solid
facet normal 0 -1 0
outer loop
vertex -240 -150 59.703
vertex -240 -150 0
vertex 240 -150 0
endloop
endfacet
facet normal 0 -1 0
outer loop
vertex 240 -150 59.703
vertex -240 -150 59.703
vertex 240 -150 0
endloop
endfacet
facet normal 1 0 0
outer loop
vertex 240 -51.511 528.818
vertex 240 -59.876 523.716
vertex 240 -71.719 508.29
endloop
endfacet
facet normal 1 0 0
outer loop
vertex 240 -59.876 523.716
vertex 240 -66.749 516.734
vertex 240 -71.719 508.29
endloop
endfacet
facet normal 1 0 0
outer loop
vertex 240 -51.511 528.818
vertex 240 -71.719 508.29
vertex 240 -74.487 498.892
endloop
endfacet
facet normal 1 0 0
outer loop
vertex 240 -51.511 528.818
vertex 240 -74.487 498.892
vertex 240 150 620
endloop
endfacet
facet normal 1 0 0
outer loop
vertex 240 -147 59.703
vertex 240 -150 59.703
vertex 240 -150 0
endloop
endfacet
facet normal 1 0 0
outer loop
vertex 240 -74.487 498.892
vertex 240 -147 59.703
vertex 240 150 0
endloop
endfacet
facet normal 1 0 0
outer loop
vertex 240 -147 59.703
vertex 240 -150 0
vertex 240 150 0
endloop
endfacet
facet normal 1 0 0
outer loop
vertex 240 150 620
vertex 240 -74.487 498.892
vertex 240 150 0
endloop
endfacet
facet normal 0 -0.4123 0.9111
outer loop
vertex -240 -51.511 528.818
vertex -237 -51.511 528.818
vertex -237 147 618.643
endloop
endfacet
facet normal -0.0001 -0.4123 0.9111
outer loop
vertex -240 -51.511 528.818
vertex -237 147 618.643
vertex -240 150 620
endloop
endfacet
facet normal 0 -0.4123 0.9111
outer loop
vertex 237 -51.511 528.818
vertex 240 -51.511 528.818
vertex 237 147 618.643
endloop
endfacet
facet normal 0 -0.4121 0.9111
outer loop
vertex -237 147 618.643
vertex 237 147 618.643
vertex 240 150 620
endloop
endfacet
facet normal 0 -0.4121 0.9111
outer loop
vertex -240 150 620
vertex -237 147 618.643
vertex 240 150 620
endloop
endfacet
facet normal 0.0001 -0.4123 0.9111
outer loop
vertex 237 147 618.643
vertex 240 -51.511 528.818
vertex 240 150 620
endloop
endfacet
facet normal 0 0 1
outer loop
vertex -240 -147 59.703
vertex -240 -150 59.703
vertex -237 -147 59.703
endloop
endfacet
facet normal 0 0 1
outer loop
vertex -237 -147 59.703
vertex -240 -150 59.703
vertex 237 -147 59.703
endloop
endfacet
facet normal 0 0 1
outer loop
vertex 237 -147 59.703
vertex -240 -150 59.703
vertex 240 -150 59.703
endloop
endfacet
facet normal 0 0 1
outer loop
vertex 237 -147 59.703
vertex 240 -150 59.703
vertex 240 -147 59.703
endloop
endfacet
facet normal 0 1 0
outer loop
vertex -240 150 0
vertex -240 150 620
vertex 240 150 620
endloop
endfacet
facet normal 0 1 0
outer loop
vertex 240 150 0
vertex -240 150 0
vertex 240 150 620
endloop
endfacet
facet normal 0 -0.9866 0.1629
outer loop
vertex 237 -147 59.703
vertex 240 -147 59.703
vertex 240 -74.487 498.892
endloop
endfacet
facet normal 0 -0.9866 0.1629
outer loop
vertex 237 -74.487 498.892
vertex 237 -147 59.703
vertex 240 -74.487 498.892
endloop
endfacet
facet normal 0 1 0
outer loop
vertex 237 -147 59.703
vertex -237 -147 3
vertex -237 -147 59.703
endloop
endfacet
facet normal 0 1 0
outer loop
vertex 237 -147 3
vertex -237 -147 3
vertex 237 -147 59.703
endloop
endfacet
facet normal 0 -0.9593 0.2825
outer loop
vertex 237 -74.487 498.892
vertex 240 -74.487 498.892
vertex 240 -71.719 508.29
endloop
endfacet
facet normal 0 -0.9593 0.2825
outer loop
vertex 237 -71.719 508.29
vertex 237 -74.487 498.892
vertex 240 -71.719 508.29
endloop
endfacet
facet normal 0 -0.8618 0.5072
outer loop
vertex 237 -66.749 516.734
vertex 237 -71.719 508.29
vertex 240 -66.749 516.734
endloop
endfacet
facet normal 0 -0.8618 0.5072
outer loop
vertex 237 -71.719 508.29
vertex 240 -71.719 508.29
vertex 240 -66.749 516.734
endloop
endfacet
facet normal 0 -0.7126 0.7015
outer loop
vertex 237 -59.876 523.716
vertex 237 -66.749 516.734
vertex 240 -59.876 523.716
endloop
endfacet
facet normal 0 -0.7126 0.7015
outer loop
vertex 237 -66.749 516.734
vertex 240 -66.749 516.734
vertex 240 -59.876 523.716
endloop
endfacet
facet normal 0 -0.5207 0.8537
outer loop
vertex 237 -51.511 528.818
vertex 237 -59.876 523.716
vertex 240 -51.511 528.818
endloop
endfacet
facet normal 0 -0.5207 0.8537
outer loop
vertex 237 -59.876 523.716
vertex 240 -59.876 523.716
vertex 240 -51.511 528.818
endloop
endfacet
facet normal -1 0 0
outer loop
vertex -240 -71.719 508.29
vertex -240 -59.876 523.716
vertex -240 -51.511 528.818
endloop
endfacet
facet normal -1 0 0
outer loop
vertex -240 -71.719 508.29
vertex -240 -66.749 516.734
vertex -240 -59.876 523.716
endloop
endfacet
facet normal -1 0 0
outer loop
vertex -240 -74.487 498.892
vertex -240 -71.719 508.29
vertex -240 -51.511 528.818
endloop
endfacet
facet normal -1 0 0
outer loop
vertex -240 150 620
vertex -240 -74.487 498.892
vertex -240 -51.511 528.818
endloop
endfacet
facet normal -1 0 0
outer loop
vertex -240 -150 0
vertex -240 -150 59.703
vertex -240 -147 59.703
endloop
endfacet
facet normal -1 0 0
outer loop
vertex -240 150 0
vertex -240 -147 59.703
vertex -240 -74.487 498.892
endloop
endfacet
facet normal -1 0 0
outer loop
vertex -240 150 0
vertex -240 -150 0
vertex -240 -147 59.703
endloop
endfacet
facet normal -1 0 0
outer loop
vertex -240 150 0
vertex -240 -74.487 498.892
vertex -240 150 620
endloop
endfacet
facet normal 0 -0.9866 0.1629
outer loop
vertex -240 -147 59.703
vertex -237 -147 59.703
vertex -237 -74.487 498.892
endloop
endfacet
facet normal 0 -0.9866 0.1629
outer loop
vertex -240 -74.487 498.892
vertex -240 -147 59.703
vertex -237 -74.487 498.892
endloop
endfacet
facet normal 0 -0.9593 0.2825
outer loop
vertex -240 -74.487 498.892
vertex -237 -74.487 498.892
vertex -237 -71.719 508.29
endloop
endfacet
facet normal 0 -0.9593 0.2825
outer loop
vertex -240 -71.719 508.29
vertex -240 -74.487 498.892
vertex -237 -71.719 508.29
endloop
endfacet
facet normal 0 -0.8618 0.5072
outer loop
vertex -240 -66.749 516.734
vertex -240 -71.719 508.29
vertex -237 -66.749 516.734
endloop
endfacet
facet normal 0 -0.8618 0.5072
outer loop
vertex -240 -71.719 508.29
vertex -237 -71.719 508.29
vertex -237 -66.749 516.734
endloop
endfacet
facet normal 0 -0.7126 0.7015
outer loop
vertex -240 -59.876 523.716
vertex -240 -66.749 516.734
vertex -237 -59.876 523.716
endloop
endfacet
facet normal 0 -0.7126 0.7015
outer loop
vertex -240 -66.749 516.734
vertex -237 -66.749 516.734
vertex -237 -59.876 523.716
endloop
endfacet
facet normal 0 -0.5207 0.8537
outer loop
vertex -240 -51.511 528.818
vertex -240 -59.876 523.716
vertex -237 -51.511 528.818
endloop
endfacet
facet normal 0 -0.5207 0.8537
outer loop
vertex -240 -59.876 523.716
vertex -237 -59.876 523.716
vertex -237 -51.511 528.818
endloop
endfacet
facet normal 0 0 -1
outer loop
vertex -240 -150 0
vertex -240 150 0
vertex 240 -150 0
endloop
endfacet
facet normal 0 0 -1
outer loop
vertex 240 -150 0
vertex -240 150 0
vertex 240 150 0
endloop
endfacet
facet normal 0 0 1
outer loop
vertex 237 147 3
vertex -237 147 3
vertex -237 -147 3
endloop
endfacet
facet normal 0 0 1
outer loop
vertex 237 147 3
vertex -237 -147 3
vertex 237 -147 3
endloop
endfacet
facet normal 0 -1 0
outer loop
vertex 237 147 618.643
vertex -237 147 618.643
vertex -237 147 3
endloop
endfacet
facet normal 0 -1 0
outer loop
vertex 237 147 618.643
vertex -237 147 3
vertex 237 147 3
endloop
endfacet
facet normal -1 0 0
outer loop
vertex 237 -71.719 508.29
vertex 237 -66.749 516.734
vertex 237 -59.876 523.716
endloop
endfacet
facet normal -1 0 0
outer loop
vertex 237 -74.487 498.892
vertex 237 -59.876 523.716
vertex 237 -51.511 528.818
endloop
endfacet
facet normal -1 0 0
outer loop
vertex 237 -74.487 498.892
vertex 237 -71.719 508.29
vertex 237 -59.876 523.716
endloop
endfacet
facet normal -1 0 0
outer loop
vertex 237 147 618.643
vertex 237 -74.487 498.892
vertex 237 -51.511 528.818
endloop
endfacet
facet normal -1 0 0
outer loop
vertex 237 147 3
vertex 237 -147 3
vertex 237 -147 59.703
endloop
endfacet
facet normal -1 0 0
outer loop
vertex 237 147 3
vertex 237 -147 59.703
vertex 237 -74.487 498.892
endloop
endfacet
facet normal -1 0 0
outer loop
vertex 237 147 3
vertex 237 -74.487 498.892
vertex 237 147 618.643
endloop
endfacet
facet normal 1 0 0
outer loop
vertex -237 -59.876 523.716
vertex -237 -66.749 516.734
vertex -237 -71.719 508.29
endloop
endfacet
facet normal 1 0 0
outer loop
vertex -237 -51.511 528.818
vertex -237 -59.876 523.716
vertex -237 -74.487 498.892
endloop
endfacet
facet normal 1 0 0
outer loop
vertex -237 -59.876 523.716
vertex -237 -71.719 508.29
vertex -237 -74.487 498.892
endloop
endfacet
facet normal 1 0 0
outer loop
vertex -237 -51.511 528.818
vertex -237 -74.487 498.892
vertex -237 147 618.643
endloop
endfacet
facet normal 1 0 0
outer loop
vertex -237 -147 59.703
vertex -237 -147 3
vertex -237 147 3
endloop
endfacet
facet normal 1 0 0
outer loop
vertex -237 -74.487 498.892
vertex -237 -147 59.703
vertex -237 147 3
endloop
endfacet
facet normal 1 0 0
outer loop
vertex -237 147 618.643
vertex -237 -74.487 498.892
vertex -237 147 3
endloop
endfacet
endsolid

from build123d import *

# Parameters (mm, degrees)
F0_W     = 480
F0_H     = 300
F1_DEPTH = 620
F2_T     = -3
F4_DEPTH = 362


with BuildPart() as f1:
    # F0 (on Top) → F1 (new body)
    with BuildSketch(Plane.XY):
        Rectangle(F0_W, F0_H)
    extrude(amount=F1_DEPTH)

    # F2
    f2_openings = [f1.faces().sort_by_distance(p)[0] for p in [
        (0, 0, 620),
    ]]
    offset(amount=F2_T, openings=f2_openings)

    # F3 (on Right) → F4 (cut, symmetric)
    with BuildSketch(Plane.YZ):
        with BuildLine():
            Line((-208.315447, 59.702795), (-150, 59.702795))
            Line((-150, 59.702795), (-147, 59.702795))
            Line((-147, 59.702795), (-74.486937, 498.891666))
            ThreePointArc((-74.486937, 498.891666), (-66.749185, 516.734135), (-51.511216, 528.818454))
            Line((-51.511216, 528.818454), (150, 620))
            Line((150, 620), (136.103183, 668.386102))
            Line((136.103183, 668.386102), (-228.213415, 668.386102))
            Line((-228.213415, 668.386102), (-208.315447, 59.702795))
        make_face()
    extrude(amount=F4_DEPTH, both=True, mode=Mode.SUBTRACT)


solid = f1.part
